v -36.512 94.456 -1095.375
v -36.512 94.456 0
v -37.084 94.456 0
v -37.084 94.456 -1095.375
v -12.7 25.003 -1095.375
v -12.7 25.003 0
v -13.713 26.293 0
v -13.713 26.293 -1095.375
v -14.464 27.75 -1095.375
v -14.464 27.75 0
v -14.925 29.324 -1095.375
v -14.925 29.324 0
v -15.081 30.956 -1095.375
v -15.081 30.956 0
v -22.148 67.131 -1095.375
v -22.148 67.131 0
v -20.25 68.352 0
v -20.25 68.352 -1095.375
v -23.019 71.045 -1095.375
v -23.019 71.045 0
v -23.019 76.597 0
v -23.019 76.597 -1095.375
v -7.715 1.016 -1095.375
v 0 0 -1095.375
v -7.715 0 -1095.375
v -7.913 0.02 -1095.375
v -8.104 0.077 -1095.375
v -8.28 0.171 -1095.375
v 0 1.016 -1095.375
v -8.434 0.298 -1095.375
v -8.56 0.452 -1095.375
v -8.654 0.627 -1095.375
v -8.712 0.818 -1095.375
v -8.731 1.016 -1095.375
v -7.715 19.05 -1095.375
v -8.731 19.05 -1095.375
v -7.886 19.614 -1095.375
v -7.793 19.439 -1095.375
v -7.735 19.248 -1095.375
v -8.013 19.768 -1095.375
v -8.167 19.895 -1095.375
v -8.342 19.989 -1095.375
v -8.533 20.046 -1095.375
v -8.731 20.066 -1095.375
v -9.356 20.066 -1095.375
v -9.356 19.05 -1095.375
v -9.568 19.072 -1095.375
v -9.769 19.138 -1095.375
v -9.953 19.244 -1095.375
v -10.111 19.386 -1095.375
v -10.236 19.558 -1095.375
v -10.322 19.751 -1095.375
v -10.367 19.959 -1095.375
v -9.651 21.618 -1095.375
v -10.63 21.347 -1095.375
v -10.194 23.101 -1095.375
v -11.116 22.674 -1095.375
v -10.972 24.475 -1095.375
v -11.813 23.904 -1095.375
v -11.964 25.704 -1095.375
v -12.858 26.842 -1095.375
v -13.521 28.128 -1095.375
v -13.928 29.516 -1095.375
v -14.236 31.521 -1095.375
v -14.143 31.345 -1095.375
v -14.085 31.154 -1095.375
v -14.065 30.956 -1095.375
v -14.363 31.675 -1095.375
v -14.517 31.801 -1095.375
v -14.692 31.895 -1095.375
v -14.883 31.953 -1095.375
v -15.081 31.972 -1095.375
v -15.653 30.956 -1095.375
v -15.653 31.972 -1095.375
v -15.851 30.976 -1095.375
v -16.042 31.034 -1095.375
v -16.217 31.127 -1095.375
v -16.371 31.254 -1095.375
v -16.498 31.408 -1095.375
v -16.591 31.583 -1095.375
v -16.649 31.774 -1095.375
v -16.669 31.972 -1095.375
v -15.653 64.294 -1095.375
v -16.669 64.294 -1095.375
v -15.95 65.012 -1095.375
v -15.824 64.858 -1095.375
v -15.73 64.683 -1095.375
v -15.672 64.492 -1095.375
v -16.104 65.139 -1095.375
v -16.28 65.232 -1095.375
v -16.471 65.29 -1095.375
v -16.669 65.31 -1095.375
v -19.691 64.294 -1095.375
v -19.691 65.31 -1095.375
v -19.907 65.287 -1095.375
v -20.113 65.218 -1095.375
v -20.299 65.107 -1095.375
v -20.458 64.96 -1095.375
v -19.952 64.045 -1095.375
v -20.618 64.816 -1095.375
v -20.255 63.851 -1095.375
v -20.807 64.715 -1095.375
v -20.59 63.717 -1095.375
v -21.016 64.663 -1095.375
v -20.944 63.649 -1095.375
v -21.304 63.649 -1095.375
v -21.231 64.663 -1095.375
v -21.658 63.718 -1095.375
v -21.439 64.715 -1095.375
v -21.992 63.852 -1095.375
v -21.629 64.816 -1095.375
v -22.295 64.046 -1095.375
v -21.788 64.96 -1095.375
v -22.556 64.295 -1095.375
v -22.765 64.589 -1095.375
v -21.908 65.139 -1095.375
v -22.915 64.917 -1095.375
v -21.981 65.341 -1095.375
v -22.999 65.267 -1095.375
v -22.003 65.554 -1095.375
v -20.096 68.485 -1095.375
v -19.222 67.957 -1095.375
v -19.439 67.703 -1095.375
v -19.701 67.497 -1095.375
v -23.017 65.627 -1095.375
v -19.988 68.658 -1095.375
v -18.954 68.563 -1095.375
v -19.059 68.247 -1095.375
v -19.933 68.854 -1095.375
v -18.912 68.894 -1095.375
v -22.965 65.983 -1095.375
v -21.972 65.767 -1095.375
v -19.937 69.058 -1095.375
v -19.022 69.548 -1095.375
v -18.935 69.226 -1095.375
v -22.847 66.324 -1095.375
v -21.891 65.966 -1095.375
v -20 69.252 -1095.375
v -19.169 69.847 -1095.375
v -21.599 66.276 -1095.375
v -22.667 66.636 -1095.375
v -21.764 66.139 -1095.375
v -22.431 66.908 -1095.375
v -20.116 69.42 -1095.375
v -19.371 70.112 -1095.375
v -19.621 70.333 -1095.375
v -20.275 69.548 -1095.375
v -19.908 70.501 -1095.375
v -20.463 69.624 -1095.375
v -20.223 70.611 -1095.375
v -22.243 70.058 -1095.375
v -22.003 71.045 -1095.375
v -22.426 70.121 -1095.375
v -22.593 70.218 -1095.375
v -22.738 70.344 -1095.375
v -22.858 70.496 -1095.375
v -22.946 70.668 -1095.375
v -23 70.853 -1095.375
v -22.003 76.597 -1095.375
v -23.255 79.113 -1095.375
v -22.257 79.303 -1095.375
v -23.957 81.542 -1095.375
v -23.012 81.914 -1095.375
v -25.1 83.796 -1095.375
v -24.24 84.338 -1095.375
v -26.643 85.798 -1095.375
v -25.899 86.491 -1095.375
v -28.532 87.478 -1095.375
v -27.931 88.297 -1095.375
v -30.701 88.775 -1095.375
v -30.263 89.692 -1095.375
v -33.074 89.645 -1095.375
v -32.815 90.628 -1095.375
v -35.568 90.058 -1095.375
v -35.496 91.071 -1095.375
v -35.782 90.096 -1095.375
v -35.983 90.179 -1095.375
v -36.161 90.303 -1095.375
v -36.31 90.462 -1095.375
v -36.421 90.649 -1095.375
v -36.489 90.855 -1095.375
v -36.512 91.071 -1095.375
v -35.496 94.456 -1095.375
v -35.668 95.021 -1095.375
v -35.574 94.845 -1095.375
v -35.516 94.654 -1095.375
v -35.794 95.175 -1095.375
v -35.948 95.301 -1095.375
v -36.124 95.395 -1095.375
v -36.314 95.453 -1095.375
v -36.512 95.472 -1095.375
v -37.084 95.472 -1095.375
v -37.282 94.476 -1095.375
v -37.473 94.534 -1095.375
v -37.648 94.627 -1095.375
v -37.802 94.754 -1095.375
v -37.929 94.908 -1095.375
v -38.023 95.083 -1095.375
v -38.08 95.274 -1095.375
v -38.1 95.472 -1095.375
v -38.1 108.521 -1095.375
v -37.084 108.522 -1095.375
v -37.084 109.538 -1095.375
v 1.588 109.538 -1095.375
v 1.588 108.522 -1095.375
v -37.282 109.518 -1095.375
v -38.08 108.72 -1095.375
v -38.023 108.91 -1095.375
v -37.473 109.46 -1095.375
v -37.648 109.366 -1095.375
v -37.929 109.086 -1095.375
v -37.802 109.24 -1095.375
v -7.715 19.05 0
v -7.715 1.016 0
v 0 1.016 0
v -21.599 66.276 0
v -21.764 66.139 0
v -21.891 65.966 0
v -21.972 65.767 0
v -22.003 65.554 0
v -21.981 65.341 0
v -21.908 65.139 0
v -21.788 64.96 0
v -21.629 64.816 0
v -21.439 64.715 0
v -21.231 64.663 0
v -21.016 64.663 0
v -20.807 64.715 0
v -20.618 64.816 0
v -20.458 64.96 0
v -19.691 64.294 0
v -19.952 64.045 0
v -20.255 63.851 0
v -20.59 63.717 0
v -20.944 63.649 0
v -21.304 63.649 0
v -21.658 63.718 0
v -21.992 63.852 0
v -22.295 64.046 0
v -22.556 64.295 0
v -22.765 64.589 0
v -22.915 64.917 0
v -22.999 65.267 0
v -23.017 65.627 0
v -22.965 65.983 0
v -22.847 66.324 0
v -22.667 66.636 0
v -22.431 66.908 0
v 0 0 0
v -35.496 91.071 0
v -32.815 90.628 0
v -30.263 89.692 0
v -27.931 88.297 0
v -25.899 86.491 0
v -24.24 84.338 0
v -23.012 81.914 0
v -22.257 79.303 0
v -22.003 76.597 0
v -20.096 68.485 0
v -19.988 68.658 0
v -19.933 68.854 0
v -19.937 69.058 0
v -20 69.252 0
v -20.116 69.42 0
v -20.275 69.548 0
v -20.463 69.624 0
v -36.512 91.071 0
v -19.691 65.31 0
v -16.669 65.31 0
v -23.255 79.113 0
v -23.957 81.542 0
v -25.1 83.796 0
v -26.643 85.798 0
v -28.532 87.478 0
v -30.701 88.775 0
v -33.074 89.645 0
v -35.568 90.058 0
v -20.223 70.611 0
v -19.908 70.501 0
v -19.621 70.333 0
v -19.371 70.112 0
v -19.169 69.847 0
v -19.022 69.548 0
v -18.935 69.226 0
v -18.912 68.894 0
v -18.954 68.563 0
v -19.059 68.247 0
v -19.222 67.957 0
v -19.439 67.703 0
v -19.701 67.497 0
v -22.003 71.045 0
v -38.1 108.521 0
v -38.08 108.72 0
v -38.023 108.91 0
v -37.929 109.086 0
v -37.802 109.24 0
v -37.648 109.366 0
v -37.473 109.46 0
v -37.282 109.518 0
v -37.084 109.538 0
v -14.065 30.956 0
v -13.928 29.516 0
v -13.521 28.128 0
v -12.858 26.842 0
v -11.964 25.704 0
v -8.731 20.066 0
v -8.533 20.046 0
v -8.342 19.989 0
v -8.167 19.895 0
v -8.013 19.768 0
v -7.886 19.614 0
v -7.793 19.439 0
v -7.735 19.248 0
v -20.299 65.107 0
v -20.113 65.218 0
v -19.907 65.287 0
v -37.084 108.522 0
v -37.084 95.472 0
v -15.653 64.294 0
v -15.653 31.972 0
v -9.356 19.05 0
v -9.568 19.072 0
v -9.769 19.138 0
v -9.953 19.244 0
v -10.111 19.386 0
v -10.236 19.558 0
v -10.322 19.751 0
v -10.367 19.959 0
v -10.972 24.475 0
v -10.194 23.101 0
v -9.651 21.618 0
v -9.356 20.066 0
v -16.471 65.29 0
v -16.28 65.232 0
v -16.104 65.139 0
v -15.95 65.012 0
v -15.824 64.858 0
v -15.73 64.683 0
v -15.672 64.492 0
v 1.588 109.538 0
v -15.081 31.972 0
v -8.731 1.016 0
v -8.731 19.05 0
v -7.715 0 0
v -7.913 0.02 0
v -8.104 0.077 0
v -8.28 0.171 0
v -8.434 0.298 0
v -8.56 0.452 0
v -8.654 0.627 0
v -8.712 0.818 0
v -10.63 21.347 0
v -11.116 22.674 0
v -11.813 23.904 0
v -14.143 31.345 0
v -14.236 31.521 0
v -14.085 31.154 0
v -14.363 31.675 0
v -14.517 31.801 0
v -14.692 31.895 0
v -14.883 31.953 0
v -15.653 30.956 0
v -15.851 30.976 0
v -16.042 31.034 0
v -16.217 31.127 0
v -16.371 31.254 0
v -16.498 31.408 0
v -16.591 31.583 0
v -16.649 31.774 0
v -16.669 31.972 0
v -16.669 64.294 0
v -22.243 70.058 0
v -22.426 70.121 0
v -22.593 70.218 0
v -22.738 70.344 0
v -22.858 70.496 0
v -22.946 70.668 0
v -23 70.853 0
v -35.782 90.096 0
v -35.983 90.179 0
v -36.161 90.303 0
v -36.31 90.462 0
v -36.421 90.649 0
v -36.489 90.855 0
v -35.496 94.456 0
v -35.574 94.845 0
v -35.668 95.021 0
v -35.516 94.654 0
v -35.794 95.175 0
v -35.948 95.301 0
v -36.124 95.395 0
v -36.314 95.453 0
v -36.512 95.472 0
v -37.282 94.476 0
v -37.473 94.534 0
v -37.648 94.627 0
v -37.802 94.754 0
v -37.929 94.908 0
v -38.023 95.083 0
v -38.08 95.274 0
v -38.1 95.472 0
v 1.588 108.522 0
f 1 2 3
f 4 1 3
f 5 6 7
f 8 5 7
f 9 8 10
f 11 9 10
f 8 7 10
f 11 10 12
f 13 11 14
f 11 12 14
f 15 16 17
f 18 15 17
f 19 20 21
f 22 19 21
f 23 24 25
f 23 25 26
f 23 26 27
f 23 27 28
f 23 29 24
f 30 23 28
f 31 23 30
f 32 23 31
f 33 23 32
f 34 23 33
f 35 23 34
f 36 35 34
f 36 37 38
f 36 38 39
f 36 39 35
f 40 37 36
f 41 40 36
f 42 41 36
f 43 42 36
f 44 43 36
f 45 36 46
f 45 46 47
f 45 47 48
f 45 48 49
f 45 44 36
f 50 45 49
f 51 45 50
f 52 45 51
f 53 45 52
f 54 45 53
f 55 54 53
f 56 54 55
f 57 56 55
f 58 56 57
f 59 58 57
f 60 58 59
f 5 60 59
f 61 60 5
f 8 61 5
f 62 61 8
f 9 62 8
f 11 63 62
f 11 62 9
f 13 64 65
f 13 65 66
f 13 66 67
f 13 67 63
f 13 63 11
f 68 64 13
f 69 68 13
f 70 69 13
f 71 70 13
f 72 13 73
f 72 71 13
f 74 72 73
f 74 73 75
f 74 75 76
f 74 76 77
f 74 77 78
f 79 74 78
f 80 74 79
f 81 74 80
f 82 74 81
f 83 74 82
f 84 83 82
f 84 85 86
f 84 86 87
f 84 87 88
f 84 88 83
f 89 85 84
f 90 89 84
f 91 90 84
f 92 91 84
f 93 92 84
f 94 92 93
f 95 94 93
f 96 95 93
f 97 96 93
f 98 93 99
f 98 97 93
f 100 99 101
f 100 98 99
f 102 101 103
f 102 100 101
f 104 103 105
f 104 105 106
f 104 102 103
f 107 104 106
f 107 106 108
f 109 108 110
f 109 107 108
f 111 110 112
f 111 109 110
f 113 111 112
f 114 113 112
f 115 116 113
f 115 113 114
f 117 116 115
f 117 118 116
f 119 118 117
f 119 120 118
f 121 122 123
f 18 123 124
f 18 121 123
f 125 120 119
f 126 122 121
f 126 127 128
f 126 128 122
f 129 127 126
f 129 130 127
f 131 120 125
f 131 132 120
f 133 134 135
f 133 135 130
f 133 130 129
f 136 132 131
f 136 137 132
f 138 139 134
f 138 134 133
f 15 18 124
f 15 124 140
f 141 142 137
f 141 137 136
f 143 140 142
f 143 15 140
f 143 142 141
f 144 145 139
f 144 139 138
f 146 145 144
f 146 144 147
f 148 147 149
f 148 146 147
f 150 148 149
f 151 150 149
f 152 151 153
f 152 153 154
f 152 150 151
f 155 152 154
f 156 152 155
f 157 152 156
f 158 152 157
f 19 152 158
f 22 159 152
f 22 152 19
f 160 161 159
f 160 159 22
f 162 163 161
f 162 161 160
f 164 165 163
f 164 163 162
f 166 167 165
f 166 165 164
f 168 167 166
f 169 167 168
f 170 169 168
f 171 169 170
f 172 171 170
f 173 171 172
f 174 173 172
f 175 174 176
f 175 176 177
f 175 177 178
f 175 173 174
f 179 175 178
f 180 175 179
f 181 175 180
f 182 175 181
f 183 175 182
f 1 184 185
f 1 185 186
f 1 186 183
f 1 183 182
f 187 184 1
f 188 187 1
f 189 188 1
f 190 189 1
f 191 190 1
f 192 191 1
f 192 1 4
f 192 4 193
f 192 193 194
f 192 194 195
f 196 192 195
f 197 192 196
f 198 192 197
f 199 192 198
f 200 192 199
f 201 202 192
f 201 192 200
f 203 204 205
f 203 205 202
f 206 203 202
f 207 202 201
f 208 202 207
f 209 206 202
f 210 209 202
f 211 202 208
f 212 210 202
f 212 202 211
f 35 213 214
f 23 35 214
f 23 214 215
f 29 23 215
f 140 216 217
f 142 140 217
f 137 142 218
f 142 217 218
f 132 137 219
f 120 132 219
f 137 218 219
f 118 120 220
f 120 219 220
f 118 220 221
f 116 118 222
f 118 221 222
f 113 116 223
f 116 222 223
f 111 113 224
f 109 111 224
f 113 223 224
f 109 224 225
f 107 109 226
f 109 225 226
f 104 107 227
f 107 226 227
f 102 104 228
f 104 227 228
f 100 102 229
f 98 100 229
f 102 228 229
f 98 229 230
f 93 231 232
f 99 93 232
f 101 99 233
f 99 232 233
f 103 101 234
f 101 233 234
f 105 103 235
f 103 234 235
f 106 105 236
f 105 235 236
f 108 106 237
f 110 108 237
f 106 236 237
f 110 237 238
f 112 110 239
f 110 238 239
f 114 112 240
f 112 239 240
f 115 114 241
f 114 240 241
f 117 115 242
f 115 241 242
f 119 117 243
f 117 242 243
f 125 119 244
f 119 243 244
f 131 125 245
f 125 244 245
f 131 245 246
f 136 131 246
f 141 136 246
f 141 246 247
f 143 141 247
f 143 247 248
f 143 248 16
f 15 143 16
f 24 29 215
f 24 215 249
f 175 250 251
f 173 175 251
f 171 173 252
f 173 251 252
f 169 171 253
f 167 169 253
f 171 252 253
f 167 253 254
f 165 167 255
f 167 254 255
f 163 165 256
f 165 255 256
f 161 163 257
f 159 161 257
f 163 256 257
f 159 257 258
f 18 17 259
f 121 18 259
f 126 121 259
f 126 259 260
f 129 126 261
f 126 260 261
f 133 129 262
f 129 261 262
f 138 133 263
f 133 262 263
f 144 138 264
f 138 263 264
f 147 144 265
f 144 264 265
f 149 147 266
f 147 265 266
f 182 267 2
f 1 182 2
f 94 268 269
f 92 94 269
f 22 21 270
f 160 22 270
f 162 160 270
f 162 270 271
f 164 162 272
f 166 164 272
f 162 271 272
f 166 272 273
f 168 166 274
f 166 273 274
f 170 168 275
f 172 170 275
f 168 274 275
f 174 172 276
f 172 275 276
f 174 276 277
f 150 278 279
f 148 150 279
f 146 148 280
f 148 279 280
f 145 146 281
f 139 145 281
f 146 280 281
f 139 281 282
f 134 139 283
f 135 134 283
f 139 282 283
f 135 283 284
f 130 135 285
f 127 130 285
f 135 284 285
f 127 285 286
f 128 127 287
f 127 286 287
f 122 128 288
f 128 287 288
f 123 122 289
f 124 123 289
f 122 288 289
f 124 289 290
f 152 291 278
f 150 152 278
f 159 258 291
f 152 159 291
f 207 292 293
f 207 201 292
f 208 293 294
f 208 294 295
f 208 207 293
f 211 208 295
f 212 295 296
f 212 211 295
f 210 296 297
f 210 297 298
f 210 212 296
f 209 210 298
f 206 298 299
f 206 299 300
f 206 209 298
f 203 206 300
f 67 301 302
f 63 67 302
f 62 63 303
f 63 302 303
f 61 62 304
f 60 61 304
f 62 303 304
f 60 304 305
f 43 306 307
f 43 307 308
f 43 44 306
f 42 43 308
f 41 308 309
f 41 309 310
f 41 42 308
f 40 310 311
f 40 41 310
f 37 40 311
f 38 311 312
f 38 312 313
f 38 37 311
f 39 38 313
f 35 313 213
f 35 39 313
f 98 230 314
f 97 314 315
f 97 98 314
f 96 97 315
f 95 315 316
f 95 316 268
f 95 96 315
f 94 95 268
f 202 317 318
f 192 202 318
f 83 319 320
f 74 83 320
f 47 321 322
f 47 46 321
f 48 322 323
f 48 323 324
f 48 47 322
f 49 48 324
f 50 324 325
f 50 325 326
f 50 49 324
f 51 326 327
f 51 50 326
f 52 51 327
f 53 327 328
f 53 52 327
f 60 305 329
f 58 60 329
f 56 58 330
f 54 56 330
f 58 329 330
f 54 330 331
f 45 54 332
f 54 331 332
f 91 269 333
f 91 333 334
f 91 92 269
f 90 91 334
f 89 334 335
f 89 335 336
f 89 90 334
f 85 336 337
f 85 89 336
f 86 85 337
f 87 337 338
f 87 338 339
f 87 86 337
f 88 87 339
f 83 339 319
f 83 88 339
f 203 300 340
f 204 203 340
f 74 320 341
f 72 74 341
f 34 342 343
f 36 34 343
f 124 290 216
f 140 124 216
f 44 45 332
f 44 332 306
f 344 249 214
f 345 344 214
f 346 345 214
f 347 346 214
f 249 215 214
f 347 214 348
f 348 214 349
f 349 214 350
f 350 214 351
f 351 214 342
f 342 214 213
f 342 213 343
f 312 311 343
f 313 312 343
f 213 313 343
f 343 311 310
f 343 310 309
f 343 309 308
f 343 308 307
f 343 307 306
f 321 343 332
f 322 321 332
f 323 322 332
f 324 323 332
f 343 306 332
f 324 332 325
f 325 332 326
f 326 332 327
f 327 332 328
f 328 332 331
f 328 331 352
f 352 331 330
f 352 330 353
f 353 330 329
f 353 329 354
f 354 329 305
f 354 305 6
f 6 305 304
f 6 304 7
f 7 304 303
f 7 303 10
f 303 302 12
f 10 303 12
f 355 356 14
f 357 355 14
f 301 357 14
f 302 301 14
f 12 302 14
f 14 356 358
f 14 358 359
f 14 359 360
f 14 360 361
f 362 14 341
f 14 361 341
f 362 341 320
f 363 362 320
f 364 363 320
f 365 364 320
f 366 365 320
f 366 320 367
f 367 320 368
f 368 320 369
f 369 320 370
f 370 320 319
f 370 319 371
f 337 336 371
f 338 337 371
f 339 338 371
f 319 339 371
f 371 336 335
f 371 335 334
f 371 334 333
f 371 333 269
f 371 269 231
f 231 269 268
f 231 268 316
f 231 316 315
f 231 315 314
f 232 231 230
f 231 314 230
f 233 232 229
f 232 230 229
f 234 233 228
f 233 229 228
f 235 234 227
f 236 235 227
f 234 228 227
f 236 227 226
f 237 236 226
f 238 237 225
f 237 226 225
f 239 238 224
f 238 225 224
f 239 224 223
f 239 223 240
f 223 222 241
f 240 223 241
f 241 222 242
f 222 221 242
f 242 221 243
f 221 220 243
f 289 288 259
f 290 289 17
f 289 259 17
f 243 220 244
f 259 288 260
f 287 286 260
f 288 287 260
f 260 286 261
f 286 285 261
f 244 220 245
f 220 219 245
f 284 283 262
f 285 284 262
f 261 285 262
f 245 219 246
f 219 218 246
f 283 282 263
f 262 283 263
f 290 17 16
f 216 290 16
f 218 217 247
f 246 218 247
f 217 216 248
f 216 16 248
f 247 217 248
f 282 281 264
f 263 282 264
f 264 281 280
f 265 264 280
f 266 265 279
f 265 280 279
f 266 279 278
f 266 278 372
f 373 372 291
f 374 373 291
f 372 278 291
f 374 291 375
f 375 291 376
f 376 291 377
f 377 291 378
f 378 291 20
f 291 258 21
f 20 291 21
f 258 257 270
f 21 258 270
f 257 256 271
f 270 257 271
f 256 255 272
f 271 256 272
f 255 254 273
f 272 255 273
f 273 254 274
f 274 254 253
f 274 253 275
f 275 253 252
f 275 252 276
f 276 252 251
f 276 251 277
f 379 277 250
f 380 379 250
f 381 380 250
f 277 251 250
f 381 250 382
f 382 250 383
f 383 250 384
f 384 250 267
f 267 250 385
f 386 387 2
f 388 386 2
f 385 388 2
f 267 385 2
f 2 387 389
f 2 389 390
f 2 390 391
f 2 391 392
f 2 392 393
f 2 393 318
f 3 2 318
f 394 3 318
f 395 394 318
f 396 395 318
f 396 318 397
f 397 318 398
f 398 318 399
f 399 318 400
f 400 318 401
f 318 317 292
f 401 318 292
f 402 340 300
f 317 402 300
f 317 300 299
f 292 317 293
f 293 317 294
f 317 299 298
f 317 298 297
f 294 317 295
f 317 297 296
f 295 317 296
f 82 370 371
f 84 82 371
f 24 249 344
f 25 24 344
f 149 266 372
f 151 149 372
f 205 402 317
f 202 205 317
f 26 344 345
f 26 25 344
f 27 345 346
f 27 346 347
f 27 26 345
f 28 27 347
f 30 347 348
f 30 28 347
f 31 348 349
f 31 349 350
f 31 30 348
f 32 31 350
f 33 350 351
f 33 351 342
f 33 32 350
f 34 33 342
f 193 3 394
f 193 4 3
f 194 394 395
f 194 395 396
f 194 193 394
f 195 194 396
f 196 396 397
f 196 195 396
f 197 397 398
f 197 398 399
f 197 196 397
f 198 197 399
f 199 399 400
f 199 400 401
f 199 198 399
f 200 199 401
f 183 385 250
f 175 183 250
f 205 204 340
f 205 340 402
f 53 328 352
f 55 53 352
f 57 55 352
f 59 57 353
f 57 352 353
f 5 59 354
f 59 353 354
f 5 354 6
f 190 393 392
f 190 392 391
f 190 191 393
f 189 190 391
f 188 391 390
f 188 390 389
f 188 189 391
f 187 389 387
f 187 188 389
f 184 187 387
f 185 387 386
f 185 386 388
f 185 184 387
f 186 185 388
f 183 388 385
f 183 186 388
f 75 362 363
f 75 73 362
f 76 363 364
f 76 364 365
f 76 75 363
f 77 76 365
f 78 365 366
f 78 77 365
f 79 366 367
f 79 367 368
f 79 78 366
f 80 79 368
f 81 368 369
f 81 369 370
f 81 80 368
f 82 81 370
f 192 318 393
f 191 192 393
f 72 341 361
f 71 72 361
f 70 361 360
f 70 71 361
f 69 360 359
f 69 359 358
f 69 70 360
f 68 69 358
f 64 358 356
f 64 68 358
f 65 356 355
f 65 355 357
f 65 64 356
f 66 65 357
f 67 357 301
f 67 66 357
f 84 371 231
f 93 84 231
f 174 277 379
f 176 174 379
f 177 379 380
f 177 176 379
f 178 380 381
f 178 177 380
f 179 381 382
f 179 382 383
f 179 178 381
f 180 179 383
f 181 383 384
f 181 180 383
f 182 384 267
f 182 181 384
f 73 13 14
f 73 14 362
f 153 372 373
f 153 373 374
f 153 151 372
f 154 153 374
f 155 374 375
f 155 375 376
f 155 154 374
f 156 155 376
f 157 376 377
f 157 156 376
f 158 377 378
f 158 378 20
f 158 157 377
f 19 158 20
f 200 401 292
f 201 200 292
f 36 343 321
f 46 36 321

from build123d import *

# Parameters (mm, degrees)
EXTRUDE_THIN1_DEPTH = 1095.375
FILLET1_R           = 1.016


with BuildPart() as part:
    # Sketch1 → Extrude-Thin1 (new body)
    with BuildSketch(Plane.XY):
        with BuildLine():
            Line((0, 0), (-8.73125, 0))
            Line((-8.73125, 0), (-8.73125, 19.05))
            Line((-8.73125, 19.05), (-10.31875, 19.05))
            ThreePointArc((-10.31875, 19.05), (-10.936141439, 22.255855924), (-12.7, 25.003125))
            ThreePointArc((-12.7, 25.003125), (-14.463858561, 27.750394076), (-15.08125, 30.95625))
            Line((-15.08125, 30.95625), (-16.66875, 30.95625))
            Line((-16.66875, 30.95625), (-16.66875, 64.29375))
            Line((-16.66875, 64.29375), (-19.690990213, 64.29375))
            ThreePointArc((-19.690990213, 64.29375), (-22.556015121, 64.295224921), (-22.148203112, 67.131077398))
            Line((-22.148203112, 67.131077398), (-20.250068746, 68.351516354))
            ThreePointArc((-20.250068746, 68.351516354), (-19.937393927, 69.05810986), (-20.463483992, 69.624033147))
            Line((-20.463483992, 69.624033147), (-23.01875, 70.246875))
            Line((-23.01875, 70.246875), (-23.01875, 76.596875))
            ThreePointArc((-23.01875, 76.596875), (-26.970977871, 86.138397129), (-36.5125, 90.090625))
            Line((-36.5125, 90.090625), (-36.5125, 94.45625))
            Line((-36.5125, 94.45625), (-38.1, 94.45625))
            Line((-38.1, 94.45625), (-38.1, 109.5375))
            Line((-38.1, 109.5375), (1.5875, 109.5375))
            Line((1.5875, 109.5375), (1.5875, 108.5215))
            Line((1.5875, 108.5215), (-37.084, 108.5215))
            Line((-37.084, 108.5215), (-37.084, 95.47225))
            Line((-37.084, 95.47225), (-35.4965, 95.47225))
            Line((-35.4965, 95.47225), (-35.4965, 91.071010175))
            ThreePointArc((-35.4965, 91.071010175), (-25.899424313, 86.491088942), (-22.00275, 76.596875))
            Line((-22.00275, 76.596875), (-22.00275, 71.044973159))
            Line((-22.00275, 71.044973159), (-20.222880084, 70.611132818))
            ThreePointArc((-20.222880084, 70.611132818), (-18.935387932, 69.226157431), (-19.700592224, 67.496921976))
            Line((-19.700592224, 67.496921976), (-21.59872659, 66.27648302))
            ThreePointArc((-21.59872659, 66.27648302), (-21.64120221, 64.825375438), (-20.272663327, 65.30975))
            Line((-20.272663327, 65.30975), (-15.65275, 65.30975))
            Line((-15.65275, 65.30975), (-15.65275, 31.97225))
            Line((-15.65275, 31.97225), (-13.99717715, 31.97225))
            ThreePointArc((-13.99717715, 31.97225), (-13.693796997, 28.60677814), (-11.964275862, 25.703814655))
            ThreePointArc((-11.964275862, 25.703814655), (-10.194199045, 23.100527755), (-9.356394818, 20.066))
            Line((-9.356394818, 20.066), (-7.71525, 20.066))
            Line((-7.71525, 20.066), (-7.71525, 1.016))
            Line((-7.71525, 1.016), (0, 1.016))
            Line((0, 1.016), (0, 0))
        make_face()
    extrude(amount=-EXTRUDE_THIN1_DEPTH)

    # Fillet1
    fillet1_edges = [part.edges().sort_by_distance(p)[0] for p in [
        (-35.4965, 95.47225, -547.6875),
        (-20.272663327, 65.30975, -547.6875),
        (-15.65275, 65.30975, -547.6875),
        (-13.99717715, 31.97225, -547.6875),
        (-7.71525, 20.066, -547.6875),
        (-8.73125, 0, -547.6875),
        (-10.31875, 19.05, -547.6875),
        (-16.66875, 30.95625, -547.6875),
        (-23.01875, 70.246875, -547.6875),
        (-36.5125, 90.090625, -547.6875),
        (-38.1, 94.45625, -547.6875),
        (-38.1, 109.5375, -547.6875),
    ]]
    fillet(fillet1_edges, radius=FILLET1_R)


solid = part.part
